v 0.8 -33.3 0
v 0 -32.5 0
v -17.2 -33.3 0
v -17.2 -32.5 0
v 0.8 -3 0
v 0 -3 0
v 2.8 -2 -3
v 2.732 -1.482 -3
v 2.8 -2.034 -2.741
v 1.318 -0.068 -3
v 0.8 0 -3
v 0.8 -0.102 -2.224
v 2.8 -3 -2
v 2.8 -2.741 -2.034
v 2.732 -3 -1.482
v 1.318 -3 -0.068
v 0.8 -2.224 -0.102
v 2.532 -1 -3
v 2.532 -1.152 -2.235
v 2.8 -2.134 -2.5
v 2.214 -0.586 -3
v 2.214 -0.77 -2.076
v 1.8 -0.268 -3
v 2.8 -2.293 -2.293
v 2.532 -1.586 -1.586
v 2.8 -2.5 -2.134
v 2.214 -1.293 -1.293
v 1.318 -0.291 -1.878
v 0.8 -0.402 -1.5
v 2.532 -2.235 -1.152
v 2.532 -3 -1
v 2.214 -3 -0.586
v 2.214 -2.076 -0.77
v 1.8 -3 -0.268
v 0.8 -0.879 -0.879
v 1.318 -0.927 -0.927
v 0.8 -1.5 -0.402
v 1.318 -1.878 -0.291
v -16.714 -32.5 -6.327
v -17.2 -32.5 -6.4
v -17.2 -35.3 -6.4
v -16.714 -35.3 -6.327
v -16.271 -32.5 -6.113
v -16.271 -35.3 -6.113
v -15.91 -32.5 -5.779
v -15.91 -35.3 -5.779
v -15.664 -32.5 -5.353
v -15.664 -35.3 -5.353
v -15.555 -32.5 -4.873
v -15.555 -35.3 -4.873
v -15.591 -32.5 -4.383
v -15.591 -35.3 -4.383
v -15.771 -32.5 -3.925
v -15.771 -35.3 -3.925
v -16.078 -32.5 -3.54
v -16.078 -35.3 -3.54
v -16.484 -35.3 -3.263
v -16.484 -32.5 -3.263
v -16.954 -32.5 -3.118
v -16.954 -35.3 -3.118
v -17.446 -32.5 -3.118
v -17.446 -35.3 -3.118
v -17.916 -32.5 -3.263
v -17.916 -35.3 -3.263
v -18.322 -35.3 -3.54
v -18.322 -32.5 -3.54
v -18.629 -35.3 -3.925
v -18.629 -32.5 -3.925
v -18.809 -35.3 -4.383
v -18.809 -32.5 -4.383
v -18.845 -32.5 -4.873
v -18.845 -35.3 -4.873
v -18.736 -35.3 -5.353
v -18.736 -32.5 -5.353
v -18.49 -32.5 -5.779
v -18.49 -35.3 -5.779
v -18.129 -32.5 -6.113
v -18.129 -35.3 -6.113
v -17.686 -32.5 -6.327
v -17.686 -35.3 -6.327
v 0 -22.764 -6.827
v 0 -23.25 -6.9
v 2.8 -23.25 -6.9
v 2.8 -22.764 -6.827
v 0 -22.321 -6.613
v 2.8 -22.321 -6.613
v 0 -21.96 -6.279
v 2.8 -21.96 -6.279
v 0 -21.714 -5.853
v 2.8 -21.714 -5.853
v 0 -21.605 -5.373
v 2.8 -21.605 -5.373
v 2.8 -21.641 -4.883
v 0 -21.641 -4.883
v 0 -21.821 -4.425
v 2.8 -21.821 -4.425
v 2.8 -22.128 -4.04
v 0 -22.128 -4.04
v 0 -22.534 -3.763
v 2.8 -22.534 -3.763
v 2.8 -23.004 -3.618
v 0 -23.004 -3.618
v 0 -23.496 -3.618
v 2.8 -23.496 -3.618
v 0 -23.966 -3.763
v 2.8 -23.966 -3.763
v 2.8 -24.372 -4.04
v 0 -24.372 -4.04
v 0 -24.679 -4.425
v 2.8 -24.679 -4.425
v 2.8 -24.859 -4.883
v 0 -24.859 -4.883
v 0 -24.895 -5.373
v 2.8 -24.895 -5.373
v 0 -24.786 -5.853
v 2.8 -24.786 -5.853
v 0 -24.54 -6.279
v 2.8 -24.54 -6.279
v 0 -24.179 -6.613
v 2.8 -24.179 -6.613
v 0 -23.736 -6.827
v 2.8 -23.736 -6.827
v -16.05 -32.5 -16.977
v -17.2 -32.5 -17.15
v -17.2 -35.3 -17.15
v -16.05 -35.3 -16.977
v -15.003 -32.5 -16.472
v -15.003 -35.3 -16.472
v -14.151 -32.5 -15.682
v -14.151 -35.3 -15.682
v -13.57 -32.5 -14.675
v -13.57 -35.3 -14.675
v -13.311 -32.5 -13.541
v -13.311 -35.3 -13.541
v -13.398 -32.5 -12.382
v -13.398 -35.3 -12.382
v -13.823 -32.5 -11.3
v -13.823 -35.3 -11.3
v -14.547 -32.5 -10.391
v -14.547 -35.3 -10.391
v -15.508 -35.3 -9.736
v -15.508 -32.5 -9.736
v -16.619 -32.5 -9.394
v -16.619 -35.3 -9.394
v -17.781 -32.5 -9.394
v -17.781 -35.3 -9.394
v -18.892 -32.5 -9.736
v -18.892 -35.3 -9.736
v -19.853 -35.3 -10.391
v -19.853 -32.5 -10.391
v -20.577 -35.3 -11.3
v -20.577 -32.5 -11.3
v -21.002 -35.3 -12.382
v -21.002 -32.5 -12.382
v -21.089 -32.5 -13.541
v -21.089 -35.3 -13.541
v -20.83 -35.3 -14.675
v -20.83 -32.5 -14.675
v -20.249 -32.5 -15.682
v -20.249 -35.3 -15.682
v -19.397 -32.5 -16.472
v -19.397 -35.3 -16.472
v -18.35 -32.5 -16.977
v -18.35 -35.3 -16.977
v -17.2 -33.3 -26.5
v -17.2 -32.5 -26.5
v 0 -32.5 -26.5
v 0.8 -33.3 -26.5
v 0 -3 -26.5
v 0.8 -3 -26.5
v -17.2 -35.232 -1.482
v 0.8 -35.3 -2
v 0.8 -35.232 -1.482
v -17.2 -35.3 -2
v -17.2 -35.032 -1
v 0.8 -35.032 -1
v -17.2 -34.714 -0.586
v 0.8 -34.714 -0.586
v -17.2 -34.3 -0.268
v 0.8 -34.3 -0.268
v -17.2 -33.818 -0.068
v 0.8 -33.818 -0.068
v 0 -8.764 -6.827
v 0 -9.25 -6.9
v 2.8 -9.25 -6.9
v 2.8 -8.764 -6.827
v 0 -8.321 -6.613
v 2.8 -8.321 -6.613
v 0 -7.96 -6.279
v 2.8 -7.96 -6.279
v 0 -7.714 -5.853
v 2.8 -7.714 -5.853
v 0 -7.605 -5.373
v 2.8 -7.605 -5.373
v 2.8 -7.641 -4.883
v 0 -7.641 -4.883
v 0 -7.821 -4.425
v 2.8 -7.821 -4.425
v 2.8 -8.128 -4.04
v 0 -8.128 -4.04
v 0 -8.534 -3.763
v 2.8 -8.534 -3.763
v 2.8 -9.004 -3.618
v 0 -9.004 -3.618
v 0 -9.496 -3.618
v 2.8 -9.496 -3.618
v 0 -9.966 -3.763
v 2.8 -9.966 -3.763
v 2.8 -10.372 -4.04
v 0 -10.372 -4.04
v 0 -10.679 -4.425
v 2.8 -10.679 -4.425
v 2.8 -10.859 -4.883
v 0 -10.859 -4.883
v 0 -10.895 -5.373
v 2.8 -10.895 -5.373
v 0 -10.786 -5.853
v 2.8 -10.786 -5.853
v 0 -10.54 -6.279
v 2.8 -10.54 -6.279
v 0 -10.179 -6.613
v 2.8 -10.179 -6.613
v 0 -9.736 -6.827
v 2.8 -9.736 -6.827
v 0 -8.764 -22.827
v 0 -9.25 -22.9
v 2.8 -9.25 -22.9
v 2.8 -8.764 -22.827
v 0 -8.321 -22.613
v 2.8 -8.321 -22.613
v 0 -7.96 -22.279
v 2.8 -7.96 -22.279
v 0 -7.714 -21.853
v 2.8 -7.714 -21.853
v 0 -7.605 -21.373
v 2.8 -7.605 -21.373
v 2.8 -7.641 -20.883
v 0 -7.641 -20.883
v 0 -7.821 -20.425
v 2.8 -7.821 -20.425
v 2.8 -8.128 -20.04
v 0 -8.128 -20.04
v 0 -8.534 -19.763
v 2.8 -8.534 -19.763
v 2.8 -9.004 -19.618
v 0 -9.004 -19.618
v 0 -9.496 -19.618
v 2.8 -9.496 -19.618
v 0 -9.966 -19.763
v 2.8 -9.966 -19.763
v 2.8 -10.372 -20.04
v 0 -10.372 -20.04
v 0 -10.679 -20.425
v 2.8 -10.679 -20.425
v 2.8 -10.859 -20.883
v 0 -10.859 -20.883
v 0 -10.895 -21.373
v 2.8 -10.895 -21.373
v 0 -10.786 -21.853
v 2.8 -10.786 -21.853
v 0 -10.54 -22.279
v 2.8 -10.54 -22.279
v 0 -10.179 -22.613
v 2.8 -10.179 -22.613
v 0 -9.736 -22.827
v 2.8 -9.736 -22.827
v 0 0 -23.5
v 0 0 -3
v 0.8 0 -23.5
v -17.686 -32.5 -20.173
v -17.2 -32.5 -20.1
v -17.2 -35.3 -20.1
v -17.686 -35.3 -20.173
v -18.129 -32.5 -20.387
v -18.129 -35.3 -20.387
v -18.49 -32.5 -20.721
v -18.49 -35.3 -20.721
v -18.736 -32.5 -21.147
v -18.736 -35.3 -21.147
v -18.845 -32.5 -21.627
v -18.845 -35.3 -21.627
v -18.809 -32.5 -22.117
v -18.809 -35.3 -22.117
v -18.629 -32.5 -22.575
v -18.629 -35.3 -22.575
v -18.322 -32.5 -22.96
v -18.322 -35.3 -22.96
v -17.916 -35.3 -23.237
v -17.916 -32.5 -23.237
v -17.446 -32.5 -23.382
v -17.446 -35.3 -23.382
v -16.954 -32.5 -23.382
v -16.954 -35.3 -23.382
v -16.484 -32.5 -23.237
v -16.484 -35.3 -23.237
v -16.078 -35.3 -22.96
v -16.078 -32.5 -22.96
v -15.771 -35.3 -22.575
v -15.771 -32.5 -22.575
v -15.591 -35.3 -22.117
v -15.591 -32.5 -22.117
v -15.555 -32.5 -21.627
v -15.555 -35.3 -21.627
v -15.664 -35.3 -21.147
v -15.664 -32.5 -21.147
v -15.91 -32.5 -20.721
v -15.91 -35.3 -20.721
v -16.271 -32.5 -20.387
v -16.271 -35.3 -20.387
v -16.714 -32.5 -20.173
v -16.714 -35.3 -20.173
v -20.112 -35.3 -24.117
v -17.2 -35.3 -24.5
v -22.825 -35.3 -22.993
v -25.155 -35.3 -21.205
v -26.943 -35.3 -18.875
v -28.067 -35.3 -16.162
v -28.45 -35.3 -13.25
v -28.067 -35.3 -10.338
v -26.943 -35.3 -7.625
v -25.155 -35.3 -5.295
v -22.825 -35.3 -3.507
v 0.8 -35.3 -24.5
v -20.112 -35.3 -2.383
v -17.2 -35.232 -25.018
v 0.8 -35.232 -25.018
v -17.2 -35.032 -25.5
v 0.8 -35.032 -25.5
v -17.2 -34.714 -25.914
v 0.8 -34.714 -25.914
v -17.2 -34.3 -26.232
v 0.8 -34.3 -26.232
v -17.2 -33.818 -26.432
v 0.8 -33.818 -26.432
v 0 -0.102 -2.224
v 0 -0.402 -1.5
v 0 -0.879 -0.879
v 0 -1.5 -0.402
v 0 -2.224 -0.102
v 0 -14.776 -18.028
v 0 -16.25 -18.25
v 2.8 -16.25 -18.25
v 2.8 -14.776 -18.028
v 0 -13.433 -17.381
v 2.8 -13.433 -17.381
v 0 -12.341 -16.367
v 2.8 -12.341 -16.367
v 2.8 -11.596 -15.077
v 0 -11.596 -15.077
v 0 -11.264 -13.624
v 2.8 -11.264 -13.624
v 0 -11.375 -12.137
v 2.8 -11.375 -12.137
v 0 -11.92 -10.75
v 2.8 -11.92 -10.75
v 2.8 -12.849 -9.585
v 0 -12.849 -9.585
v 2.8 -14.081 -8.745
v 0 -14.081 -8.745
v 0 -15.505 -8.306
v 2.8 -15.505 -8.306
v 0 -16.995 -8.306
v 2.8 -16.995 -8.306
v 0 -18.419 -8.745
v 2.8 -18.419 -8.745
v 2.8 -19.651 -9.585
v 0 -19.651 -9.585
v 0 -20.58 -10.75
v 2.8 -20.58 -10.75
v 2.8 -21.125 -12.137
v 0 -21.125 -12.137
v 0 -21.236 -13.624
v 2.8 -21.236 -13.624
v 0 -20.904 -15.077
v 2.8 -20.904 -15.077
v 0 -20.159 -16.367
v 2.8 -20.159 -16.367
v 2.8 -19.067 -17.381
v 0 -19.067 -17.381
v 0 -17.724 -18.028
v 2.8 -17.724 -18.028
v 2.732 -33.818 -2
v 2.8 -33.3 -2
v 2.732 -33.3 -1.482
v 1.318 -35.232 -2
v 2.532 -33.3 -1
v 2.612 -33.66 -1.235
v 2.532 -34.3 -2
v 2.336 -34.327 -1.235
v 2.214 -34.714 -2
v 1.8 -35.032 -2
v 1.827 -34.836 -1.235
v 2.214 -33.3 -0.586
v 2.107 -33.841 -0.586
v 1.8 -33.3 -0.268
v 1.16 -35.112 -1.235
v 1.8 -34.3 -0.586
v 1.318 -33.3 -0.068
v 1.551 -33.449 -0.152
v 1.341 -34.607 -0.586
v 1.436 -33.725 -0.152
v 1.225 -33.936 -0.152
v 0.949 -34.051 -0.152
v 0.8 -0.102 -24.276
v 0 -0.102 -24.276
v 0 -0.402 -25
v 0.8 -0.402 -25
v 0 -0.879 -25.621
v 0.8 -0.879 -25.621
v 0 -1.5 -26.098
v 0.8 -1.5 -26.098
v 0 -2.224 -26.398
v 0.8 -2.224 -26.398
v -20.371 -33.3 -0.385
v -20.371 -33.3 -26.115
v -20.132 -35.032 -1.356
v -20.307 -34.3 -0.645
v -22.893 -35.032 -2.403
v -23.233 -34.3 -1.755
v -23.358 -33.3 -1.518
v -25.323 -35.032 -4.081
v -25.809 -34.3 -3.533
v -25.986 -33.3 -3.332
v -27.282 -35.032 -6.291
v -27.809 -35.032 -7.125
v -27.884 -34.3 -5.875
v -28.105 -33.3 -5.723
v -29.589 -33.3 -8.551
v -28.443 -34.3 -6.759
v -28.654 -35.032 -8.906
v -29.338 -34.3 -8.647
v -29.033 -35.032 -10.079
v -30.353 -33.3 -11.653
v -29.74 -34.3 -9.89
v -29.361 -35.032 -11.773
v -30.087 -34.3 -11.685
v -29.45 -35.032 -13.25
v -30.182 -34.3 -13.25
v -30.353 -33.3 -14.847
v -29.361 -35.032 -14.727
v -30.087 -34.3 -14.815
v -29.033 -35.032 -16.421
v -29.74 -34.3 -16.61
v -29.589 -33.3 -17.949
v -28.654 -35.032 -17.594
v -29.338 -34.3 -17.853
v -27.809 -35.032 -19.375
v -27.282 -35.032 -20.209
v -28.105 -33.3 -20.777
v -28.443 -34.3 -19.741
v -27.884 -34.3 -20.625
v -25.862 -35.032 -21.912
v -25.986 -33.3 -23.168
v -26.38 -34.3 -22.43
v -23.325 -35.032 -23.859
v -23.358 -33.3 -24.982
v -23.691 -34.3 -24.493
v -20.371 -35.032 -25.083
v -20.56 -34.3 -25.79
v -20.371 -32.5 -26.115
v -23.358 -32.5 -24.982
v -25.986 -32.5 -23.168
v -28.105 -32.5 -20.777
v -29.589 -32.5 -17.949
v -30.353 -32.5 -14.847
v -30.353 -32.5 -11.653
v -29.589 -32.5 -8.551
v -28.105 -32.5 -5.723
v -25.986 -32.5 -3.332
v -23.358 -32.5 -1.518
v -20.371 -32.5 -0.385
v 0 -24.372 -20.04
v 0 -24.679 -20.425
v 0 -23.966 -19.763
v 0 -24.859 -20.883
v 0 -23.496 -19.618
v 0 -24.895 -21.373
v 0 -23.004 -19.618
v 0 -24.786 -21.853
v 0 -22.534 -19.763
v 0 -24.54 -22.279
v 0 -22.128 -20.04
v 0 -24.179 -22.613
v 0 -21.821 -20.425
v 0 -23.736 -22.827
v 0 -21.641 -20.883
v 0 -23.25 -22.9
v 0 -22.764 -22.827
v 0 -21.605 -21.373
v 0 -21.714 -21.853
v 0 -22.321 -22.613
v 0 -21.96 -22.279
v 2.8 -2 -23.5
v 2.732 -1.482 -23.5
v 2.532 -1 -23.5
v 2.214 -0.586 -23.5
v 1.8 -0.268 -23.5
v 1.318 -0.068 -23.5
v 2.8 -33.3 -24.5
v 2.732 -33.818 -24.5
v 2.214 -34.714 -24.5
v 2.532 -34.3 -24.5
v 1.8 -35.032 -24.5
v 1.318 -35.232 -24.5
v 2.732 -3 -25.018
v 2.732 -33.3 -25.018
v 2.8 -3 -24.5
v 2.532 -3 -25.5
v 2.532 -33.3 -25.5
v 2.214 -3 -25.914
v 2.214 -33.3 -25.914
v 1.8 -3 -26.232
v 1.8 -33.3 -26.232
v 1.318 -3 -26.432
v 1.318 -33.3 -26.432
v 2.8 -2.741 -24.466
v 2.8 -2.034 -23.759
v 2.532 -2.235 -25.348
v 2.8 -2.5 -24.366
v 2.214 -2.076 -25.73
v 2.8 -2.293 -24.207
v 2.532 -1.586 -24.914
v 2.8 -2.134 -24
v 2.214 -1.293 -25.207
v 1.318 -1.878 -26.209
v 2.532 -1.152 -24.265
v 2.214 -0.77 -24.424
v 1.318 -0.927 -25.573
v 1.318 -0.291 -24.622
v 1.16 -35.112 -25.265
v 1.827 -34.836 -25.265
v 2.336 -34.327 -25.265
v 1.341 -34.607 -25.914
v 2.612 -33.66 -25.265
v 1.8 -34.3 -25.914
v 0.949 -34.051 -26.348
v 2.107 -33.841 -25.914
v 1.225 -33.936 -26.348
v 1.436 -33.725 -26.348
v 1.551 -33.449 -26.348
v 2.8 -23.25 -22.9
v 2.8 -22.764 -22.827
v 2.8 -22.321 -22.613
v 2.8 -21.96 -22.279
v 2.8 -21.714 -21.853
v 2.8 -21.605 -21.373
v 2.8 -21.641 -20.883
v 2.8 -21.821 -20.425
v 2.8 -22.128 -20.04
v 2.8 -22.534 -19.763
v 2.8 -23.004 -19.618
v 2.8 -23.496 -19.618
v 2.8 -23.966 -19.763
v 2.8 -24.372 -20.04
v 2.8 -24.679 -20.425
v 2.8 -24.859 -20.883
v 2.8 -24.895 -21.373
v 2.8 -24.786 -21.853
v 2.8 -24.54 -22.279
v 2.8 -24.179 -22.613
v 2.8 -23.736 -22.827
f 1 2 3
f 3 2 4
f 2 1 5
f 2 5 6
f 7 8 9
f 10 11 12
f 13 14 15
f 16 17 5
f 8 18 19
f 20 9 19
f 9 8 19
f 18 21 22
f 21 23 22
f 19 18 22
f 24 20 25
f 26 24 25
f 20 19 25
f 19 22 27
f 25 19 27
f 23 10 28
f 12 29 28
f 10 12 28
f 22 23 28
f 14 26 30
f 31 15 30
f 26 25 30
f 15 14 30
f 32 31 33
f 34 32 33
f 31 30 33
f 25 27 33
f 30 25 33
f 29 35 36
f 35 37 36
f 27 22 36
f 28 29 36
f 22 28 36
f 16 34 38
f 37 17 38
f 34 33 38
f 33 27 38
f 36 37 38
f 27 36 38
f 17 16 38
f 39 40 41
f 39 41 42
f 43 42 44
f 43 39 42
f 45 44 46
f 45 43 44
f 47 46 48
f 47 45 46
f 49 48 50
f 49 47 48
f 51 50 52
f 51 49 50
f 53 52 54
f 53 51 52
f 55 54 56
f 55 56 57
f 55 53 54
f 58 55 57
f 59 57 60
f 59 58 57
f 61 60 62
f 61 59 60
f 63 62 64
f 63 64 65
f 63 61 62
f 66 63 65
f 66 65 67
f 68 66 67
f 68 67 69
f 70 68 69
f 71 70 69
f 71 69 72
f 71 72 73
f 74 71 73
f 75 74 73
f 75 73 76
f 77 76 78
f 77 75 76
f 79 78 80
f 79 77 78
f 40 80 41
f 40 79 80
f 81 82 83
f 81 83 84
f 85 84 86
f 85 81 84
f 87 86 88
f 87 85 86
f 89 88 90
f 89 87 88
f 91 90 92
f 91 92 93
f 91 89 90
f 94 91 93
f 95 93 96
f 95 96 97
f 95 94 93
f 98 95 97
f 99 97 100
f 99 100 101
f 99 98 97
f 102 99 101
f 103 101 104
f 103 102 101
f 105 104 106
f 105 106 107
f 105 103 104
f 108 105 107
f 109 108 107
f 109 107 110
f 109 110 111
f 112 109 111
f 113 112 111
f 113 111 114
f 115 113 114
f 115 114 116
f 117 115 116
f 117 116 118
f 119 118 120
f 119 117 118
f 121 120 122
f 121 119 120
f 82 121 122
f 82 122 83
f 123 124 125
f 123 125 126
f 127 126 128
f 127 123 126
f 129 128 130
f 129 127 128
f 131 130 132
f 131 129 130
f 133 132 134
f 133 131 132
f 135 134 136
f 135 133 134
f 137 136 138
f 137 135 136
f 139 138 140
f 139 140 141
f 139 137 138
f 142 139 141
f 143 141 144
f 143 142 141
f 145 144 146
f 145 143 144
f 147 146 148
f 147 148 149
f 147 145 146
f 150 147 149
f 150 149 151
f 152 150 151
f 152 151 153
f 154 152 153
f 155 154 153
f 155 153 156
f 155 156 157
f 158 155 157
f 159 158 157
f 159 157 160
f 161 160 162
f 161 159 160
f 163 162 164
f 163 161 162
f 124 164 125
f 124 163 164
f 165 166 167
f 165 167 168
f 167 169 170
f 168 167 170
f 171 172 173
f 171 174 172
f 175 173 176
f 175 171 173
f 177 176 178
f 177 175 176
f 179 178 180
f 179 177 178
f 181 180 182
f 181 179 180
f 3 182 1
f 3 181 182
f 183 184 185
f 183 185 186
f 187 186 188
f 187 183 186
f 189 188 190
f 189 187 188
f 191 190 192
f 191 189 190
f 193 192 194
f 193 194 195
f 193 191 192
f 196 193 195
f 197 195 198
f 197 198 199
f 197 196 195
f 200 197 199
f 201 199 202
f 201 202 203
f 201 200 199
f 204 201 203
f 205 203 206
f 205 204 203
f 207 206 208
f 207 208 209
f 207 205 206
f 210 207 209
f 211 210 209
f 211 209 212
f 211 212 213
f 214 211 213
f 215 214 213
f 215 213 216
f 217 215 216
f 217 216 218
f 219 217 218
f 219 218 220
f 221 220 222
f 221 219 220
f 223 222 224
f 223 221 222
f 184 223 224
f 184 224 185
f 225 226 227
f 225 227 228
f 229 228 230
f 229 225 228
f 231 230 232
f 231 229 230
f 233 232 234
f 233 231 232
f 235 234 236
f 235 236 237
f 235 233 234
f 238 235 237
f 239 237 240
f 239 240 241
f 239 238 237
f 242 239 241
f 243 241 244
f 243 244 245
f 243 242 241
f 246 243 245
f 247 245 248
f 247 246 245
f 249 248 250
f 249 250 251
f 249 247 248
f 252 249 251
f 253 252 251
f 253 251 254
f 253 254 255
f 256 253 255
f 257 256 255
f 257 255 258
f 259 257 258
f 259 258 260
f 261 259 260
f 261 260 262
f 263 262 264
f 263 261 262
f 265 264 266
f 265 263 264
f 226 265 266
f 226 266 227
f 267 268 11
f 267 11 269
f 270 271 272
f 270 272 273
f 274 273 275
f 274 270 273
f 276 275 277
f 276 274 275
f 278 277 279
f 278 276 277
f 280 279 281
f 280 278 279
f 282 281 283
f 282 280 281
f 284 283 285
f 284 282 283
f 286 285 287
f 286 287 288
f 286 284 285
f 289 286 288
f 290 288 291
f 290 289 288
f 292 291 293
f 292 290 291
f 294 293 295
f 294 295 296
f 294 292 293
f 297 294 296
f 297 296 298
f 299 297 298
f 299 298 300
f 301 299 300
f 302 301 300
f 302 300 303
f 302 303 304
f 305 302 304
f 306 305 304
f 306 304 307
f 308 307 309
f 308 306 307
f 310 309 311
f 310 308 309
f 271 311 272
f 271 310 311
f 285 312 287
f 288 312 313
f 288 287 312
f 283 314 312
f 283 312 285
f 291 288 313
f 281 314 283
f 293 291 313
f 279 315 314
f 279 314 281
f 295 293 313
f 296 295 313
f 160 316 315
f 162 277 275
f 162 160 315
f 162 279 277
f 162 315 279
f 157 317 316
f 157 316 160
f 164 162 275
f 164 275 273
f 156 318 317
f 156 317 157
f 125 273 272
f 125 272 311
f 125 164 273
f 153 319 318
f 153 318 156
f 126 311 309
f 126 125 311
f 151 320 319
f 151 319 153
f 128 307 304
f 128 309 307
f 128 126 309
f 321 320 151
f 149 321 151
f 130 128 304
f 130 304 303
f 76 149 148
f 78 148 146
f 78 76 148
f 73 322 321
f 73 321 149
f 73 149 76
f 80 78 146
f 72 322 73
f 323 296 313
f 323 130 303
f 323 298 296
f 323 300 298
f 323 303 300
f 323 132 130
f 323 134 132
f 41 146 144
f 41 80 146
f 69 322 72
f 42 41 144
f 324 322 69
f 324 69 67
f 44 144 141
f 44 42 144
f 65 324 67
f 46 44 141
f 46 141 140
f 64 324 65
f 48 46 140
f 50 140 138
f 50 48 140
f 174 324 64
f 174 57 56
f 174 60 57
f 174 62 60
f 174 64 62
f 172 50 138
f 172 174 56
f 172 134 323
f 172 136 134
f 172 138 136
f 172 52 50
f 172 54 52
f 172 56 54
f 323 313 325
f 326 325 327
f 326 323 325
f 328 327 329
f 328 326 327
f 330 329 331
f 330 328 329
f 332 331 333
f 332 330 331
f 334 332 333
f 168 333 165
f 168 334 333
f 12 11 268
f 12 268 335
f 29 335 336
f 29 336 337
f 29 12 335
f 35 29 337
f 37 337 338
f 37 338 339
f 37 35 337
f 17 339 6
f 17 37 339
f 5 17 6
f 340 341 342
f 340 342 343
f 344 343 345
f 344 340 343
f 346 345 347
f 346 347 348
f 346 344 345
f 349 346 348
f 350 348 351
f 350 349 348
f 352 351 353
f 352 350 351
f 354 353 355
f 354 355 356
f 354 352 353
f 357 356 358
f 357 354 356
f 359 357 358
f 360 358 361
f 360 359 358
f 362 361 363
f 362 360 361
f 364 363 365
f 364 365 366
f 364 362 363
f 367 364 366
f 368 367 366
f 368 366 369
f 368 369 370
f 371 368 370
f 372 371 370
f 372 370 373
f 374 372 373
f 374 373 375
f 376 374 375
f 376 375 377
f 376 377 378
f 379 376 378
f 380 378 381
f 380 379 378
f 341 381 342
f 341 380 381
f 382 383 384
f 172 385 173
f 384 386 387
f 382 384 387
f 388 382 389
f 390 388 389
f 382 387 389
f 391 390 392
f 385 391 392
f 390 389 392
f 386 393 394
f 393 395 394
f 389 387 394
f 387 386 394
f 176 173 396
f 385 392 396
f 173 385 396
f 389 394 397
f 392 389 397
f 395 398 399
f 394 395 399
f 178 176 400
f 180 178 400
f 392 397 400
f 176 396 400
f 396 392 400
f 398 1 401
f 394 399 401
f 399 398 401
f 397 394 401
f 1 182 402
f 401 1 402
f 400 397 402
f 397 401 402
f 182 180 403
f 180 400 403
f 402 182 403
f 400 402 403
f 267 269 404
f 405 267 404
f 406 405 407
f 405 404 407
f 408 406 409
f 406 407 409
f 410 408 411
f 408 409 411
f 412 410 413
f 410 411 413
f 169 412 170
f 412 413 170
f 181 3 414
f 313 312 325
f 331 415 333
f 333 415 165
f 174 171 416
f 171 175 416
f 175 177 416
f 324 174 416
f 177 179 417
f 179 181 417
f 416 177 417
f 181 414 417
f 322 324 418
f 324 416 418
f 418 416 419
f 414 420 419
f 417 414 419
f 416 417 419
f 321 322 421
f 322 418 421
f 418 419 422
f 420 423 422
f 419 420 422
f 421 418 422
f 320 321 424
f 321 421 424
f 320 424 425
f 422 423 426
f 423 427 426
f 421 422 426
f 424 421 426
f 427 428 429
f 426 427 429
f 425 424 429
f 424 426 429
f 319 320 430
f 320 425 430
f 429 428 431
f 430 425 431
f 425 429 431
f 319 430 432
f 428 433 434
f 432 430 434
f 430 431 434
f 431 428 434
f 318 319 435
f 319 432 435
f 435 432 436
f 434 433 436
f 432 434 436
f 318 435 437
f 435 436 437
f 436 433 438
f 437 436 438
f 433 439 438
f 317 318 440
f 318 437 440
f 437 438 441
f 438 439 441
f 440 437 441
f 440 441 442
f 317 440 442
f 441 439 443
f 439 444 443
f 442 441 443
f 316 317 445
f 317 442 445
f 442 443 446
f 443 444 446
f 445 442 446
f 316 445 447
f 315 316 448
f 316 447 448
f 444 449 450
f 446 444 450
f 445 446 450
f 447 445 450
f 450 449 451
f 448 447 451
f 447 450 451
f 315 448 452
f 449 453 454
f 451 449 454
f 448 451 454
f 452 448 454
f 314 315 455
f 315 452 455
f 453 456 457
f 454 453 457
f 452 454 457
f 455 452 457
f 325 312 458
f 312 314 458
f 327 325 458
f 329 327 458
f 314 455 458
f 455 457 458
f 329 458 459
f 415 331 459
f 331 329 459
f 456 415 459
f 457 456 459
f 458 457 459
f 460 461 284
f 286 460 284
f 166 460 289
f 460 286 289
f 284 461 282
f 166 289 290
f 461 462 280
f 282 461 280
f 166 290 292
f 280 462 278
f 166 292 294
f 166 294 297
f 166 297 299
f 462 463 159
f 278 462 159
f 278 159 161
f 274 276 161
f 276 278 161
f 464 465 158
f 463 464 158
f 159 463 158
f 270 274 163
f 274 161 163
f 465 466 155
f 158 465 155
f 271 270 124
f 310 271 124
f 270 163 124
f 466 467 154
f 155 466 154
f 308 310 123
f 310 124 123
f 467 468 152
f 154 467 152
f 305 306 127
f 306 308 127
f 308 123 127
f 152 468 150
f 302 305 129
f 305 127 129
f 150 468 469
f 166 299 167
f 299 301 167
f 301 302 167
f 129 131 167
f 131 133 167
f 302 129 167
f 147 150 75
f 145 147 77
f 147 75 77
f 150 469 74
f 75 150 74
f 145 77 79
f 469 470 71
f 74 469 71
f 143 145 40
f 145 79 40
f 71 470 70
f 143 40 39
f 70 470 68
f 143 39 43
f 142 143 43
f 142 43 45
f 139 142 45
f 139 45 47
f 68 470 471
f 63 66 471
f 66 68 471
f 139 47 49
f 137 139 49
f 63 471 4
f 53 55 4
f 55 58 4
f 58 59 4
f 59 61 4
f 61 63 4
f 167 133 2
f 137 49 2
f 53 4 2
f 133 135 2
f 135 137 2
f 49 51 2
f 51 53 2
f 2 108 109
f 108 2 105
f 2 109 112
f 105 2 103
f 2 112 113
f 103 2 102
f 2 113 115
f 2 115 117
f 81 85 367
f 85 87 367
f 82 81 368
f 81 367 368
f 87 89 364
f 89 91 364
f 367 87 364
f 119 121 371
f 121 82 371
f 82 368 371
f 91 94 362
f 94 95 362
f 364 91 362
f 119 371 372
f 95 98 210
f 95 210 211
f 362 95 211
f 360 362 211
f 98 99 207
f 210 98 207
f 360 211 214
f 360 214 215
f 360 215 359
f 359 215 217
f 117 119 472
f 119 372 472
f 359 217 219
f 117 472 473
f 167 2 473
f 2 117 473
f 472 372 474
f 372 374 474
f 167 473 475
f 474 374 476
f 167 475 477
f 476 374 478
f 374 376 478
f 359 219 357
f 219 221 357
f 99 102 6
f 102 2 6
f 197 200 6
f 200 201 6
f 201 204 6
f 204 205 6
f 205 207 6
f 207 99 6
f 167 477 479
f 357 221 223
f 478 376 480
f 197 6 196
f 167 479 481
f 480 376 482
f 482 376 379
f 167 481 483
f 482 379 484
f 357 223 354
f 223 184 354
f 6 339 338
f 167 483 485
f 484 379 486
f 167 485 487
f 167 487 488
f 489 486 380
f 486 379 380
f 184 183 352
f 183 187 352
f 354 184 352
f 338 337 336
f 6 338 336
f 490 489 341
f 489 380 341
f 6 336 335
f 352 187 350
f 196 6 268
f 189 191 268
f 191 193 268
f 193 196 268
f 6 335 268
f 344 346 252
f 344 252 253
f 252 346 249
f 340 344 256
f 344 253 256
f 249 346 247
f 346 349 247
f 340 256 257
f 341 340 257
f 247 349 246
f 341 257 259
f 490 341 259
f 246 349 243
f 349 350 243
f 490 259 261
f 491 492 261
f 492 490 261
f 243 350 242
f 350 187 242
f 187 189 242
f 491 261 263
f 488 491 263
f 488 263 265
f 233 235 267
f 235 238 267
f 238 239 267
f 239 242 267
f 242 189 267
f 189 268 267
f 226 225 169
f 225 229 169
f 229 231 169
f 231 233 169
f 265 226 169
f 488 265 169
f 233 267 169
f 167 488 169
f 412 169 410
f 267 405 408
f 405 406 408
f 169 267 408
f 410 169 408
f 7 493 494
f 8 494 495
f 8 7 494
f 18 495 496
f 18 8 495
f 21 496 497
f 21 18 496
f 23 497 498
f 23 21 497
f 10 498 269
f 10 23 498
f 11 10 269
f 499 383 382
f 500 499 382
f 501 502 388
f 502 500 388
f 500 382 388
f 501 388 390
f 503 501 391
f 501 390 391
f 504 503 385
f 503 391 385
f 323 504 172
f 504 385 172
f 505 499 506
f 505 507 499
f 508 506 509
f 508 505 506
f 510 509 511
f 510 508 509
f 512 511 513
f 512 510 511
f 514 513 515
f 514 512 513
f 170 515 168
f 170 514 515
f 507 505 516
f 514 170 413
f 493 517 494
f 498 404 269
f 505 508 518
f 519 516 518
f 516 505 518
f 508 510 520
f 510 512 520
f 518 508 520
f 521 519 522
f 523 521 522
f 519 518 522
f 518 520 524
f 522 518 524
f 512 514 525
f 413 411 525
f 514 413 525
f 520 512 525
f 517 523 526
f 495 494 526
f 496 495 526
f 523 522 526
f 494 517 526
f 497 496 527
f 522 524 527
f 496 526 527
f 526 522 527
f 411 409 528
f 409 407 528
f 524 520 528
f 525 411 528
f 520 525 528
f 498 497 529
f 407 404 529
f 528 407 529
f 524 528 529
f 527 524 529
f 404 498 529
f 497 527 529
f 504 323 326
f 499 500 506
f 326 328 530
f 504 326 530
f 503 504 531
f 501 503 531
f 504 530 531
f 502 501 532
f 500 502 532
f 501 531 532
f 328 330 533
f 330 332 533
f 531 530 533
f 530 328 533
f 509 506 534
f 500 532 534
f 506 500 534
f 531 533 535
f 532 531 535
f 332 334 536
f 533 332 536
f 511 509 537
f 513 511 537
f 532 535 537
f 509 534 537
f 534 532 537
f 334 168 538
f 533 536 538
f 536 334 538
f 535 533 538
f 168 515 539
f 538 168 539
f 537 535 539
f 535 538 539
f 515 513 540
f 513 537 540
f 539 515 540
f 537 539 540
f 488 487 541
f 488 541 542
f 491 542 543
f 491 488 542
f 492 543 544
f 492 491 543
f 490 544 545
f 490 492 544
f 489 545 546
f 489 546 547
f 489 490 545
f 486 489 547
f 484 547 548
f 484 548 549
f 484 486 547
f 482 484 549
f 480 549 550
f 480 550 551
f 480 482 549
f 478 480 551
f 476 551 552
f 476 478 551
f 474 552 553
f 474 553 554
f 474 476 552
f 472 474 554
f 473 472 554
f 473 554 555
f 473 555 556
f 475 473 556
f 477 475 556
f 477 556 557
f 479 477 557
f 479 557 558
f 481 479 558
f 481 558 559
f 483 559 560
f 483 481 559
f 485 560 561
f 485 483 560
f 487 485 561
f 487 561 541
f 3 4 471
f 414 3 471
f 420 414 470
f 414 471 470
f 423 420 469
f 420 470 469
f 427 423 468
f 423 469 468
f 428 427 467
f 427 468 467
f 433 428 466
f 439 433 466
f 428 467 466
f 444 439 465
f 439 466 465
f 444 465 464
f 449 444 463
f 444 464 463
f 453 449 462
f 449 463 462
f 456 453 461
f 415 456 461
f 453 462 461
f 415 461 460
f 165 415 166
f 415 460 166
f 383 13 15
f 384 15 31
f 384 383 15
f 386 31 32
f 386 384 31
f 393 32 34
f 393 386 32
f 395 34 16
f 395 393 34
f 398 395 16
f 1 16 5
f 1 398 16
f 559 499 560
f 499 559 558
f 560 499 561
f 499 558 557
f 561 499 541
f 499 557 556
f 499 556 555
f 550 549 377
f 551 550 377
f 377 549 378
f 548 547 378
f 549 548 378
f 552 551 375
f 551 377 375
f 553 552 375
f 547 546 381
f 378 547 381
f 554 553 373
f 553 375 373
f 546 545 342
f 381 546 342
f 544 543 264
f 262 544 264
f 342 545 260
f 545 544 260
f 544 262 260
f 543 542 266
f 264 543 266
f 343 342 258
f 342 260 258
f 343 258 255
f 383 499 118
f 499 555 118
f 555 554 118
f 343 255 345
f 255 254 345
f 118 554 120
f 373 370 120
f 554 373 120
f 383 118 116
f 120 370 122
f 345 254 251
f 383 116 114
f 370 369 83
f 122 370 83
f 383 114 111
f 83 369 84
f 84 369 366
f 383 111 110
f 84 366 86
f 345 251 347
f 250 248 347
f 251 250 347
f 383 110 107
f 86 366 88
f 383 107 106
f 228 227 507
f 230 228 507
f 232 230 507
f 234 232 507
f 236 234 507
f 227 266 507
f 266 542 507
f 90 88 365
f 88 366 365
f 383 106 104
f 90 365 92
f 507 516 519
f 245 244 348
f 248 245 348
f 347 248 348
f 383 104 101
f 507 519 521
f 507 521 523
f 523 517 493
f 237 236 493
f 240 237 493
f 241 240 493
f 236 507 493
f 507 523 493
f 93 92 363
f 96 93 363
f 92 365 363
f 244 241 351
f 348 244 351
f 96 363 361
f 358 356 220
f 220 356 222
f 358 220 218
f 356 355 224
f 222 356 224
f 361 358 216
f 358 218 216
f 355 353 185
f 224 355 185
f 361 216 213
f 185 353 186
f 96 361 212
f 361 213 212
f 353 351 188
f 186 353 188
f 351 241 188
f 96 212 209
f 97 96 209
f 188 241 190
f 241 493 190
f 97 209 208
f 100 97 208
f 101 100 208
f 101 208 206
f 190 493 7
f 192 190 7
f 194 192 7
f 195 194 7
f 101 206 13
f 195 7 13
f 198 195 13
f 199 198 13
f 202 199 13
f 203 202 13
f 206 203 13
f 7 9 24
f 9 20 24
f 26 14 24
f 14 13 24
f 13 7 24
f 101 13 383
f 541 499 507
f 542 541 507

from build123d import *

# Parameters (mm, degrees)
SKETCH_1_W      = 26.5
SKETCH_1_H      = 32.5
SKETCH_1_R      = 5
SKETCH_1_R_2    = 1.65
EXTRUDE_1_DEPTH = 2.8
SKETCH_3_R      = 3.9
SKETCH_3_R_2    = 1.65
EXTRUDE_2_DEPTH = 2.8
FILLET_2_R      = 3
FILLET_3_R      = 3
FILLET_4_R      = 2
FILLET_5_R      = 2


with BuildPart() as part:
    # 草图1 → 凸台-拉伸1 (new body)
    with BuildSketch(Plane(origin=(0, 0, 0), x_dir=(0, 0, -1), z_dir=(1, 0, 0))):
        with Locations((13.25, -16.25)):
            Rectangle(SKETCH_1_W, SKETCH_1_H)
        with Locations((13.25, -16.25)):
            Circle(SKETCH_1_R, mode=Mode.SUBTRACT)
        with Locations((5.25, -9.25)):
            Circle(SKETCH_1_R_2, mode=Mode.SUBTRACT)
        with Locations((21.25, -9.25)):
            Circle(SKETCH_1_R_2, mode=Mode.SUBTRACT)
        with Locations((5.25, -23.25)):
            Circle(SKETCH_1_R_2, mode=Mode.SUBTRACT)
        with Locations((21.25, -23.25)):
            Circle(SKETCH_1_R_2, mode=Mode.SUBTRACT)
    extrude(amount=EXTRUDE_1_DEPTH)

    # 草图3 → 凸台-拉伸2 (add)
    with BuildSketch(Plane.XZ.offset(32.5)):
        with BuildLine():
            Line((2.8, 0), (-17.2, 0))
            ThreePointArc((-17.2, 0), (-30.45, -13.25), (-17.2, -26.5))
            Line((-17.2, -26.5), (2.8, -26.5))
            Line((2.8, -26.5), (2.8, 0))
        make_face()
        with Locations(Location((-17.2, -13.25, 0), (0, 0, 270))):
            Circle(SKETCH_3_R, mode=Mode.SUBTRACT)
        with Locations(Location((-17.2, -4.75, 0), (0, 0, 270))):
            Circle(SKETCH_3_R_2, mode=Mode.SUBTRACT)
        with Locations(Location((-17.2, -21.75, 0), (0, 0, 90))):
            Circle(SKETCH_3_R_2, mode=Mode.SUBTRACT)
    extrude(amount=EXTRUDE_2_DEPTH)

    # 圆角2
    fillet_2_edges = [part.edges().sort_by_distance(p)[0] for p in [
        (1.4, 0, -26.5),
    ]]
    fillet(fillet_2_edges, radius=FILLET_2_R)

    # 圆角3
    fillet_3_edges = [part.edges().sort_by_distance(p)[0] for p in [
        (1.4, 0, 0),
    ]]
    fillet(fillet_3_edges, radius=FILLET_3_R)

    # 圆角4
    fillet_4_edges = [part.edges().sort_by_distance(p)[0] for p in [
        (2.8, -35.3, -13.25),
    ]]
    fillet(fillet_4_edges, radius=FILLET_4_R)

    # 圆角5
    fillet_5_edges = [part.edges().sort_by_distance(p)[0] for p in [
        (-30.45, -35.3, -13.25),
        (-8.2, -35.3, -26.5),
        (2.8, 0, -13.25),
        (2.8, -0.878679656, -25.621320344),
        (2.8, -18.15, 0),
        (2.8, -0.878679656, -0.878679656),
        (-8.2, -35.3, 0),
        (2.214213562, -34.714213562, 0),
        (2.8, -18.15, -26.5),
        (2.214213562, -34.714213562, -26.5),
    ]]
    fillet(fillet_5_edges, radius=FILLET_5_R)


solid = part.part
